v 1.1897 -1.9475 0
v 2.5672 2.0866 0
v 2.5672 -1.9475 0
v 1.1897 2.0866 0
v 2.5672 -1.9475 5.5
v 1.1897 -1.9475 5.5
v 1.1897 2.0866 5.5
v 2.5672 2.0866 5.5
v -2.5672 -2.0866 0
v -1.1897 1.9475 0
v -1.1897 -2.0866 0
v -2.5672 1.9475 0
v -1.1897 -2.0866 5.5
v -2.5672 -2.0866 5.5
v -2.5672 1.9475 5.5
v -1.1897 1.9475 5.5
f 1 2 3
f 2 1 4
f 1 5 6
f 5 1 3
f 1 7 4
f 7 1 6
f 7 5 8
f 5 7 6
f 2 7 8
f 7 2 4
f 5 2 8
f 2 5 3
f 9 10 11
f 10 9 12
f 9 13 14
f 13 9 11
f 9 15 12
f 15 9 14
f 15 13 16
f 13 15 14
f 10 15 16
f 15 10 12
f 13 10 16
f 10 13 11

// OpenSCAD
// Module names are of the form poly_<inkscape-path-id>().  As a result,
// you can associate a polygon in this OpenSCAD program with the corresponding
// SVG element in the Inkscape document by looking for the XML element with
// the attribute id="inkscape-path-id".

// fudge value is used to ensure that subtracted solids are a tad taller
// in the z dimension than the polygon being subtracted from.  This helps
// keep the resulting .stl file manifold.
fudge = 0.1;

module poly_rect41706(h)
{
  scale([25.4/90, -25.4/90, 1]) union()
  {
    linear_extrude(height=h)
      polygon([[4.215628,-7.393497],[9.096489,-7.393497],[9.096489,6.900456],[4.215628,6.900456]]);
  }
}

module poly_rect41703(h)
{
  scale([25.4/90, -25.4/90, 1]) union()
  {
    linear_extrude(height=h)
      polygon([[-9.096489,-6.900456],[-4.215628,-6.900456],[-4.215628,7.393497],[-9.096489,7.393497]]);
  }
}

height = 5.5;
poly_rect41706(height);
poly_rect41703(height);
